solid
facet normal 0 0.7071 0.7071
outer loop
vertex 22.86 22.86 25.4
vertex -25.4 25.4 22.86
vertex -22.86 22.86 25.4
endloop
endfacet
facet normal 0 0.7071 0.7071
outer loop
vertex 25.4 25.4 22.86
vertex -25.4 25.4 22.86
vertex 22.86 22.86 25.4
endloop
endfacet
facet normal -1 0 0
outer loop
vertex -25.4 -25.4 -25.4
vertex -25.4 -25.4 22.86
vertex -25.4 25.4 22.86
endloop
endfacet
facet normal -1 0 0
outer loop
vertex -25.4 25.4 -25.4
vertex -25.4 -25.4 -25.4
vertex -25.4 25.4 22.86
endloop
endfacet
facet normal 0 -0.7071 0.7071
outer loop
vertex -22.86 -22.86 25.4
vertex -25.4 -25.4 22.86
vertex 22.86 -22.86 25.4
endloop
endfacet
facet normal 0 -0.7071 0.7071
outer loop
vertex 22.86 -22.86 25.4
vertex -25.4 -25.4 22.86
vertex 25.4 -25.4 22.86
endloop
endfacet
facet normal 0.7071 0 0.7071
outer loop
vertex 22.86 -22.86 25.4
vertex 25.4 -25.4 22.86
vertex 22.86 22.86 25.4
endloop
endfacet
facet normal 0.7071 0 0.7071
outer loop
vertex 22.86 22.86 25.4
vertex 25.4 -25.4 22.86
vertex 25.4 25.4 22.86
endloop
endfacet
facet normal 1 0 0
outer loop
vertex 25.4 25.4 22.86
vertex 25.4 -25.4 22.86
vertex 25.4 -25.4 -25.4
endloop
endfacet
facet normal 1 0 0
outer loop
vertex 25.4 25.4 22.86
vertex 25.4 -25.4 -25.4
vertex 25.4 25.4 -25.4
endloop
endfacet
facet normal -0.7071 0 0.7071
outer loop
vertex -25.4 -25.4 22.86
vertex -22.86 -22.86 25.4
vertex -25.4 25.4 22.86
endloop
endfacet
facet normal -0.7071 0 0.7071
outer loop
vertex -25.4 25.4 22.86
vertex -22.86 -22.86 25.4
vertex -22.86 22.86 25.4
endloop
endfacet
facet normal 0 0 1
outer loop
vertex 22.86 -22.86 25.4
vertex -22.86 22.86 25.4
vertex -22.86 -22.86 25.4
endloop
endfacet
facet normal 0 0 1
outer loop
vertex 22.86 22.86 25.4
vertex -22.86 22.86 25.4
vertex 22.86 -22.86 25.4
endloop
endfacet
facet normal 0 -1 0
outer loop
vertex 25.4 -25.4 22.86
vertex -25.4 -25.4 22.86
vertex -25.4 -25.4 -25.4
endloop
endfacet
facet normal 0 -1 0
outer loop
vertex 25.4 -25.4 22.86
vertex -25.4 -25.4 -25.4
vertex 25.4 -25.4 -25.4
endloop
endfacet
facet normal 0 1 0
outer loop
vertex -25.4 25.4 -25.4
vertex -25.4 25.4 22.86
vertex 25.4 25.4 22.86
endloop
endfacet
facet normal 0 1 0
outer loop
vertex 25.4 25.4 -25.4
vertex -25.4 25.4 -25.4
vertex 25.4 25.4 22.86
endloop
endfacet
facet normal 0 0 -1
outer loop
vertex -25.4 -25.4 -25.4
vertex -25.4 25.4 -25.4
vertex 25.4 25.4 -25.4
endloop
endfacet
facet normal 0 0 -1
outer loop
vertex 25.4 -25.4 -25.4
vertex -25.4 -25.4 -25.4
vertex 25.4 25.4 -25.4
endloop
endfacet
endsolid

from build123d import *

# Parameters (mm, degrees)
F0_W     = 50.8
F0_H     = 50.8
F1_DEPTH = 25.4
F2_SIZE  = 2.54


with BuildPart() as f1:
    # F0 (on Top) → F1 (new body, symmetric)
    with BuildSketch(Plane.XY):
        Rectangle(F0_W, F0_H)
    extrude(amount=F1_DEPTH, both=True)

    # F2
    f2_edges = [f1.edges().sort_by_distance(p)[0] for p in [
        (0, 25.4, 25.4),
        (-25.4, 0, 25.4),
        (0, -25.4, 25.4),
        (25.4, 0, 25.4),
    ]]
    chamfer(f2_edges, length=F2_SIZE)


solid = f1.part
